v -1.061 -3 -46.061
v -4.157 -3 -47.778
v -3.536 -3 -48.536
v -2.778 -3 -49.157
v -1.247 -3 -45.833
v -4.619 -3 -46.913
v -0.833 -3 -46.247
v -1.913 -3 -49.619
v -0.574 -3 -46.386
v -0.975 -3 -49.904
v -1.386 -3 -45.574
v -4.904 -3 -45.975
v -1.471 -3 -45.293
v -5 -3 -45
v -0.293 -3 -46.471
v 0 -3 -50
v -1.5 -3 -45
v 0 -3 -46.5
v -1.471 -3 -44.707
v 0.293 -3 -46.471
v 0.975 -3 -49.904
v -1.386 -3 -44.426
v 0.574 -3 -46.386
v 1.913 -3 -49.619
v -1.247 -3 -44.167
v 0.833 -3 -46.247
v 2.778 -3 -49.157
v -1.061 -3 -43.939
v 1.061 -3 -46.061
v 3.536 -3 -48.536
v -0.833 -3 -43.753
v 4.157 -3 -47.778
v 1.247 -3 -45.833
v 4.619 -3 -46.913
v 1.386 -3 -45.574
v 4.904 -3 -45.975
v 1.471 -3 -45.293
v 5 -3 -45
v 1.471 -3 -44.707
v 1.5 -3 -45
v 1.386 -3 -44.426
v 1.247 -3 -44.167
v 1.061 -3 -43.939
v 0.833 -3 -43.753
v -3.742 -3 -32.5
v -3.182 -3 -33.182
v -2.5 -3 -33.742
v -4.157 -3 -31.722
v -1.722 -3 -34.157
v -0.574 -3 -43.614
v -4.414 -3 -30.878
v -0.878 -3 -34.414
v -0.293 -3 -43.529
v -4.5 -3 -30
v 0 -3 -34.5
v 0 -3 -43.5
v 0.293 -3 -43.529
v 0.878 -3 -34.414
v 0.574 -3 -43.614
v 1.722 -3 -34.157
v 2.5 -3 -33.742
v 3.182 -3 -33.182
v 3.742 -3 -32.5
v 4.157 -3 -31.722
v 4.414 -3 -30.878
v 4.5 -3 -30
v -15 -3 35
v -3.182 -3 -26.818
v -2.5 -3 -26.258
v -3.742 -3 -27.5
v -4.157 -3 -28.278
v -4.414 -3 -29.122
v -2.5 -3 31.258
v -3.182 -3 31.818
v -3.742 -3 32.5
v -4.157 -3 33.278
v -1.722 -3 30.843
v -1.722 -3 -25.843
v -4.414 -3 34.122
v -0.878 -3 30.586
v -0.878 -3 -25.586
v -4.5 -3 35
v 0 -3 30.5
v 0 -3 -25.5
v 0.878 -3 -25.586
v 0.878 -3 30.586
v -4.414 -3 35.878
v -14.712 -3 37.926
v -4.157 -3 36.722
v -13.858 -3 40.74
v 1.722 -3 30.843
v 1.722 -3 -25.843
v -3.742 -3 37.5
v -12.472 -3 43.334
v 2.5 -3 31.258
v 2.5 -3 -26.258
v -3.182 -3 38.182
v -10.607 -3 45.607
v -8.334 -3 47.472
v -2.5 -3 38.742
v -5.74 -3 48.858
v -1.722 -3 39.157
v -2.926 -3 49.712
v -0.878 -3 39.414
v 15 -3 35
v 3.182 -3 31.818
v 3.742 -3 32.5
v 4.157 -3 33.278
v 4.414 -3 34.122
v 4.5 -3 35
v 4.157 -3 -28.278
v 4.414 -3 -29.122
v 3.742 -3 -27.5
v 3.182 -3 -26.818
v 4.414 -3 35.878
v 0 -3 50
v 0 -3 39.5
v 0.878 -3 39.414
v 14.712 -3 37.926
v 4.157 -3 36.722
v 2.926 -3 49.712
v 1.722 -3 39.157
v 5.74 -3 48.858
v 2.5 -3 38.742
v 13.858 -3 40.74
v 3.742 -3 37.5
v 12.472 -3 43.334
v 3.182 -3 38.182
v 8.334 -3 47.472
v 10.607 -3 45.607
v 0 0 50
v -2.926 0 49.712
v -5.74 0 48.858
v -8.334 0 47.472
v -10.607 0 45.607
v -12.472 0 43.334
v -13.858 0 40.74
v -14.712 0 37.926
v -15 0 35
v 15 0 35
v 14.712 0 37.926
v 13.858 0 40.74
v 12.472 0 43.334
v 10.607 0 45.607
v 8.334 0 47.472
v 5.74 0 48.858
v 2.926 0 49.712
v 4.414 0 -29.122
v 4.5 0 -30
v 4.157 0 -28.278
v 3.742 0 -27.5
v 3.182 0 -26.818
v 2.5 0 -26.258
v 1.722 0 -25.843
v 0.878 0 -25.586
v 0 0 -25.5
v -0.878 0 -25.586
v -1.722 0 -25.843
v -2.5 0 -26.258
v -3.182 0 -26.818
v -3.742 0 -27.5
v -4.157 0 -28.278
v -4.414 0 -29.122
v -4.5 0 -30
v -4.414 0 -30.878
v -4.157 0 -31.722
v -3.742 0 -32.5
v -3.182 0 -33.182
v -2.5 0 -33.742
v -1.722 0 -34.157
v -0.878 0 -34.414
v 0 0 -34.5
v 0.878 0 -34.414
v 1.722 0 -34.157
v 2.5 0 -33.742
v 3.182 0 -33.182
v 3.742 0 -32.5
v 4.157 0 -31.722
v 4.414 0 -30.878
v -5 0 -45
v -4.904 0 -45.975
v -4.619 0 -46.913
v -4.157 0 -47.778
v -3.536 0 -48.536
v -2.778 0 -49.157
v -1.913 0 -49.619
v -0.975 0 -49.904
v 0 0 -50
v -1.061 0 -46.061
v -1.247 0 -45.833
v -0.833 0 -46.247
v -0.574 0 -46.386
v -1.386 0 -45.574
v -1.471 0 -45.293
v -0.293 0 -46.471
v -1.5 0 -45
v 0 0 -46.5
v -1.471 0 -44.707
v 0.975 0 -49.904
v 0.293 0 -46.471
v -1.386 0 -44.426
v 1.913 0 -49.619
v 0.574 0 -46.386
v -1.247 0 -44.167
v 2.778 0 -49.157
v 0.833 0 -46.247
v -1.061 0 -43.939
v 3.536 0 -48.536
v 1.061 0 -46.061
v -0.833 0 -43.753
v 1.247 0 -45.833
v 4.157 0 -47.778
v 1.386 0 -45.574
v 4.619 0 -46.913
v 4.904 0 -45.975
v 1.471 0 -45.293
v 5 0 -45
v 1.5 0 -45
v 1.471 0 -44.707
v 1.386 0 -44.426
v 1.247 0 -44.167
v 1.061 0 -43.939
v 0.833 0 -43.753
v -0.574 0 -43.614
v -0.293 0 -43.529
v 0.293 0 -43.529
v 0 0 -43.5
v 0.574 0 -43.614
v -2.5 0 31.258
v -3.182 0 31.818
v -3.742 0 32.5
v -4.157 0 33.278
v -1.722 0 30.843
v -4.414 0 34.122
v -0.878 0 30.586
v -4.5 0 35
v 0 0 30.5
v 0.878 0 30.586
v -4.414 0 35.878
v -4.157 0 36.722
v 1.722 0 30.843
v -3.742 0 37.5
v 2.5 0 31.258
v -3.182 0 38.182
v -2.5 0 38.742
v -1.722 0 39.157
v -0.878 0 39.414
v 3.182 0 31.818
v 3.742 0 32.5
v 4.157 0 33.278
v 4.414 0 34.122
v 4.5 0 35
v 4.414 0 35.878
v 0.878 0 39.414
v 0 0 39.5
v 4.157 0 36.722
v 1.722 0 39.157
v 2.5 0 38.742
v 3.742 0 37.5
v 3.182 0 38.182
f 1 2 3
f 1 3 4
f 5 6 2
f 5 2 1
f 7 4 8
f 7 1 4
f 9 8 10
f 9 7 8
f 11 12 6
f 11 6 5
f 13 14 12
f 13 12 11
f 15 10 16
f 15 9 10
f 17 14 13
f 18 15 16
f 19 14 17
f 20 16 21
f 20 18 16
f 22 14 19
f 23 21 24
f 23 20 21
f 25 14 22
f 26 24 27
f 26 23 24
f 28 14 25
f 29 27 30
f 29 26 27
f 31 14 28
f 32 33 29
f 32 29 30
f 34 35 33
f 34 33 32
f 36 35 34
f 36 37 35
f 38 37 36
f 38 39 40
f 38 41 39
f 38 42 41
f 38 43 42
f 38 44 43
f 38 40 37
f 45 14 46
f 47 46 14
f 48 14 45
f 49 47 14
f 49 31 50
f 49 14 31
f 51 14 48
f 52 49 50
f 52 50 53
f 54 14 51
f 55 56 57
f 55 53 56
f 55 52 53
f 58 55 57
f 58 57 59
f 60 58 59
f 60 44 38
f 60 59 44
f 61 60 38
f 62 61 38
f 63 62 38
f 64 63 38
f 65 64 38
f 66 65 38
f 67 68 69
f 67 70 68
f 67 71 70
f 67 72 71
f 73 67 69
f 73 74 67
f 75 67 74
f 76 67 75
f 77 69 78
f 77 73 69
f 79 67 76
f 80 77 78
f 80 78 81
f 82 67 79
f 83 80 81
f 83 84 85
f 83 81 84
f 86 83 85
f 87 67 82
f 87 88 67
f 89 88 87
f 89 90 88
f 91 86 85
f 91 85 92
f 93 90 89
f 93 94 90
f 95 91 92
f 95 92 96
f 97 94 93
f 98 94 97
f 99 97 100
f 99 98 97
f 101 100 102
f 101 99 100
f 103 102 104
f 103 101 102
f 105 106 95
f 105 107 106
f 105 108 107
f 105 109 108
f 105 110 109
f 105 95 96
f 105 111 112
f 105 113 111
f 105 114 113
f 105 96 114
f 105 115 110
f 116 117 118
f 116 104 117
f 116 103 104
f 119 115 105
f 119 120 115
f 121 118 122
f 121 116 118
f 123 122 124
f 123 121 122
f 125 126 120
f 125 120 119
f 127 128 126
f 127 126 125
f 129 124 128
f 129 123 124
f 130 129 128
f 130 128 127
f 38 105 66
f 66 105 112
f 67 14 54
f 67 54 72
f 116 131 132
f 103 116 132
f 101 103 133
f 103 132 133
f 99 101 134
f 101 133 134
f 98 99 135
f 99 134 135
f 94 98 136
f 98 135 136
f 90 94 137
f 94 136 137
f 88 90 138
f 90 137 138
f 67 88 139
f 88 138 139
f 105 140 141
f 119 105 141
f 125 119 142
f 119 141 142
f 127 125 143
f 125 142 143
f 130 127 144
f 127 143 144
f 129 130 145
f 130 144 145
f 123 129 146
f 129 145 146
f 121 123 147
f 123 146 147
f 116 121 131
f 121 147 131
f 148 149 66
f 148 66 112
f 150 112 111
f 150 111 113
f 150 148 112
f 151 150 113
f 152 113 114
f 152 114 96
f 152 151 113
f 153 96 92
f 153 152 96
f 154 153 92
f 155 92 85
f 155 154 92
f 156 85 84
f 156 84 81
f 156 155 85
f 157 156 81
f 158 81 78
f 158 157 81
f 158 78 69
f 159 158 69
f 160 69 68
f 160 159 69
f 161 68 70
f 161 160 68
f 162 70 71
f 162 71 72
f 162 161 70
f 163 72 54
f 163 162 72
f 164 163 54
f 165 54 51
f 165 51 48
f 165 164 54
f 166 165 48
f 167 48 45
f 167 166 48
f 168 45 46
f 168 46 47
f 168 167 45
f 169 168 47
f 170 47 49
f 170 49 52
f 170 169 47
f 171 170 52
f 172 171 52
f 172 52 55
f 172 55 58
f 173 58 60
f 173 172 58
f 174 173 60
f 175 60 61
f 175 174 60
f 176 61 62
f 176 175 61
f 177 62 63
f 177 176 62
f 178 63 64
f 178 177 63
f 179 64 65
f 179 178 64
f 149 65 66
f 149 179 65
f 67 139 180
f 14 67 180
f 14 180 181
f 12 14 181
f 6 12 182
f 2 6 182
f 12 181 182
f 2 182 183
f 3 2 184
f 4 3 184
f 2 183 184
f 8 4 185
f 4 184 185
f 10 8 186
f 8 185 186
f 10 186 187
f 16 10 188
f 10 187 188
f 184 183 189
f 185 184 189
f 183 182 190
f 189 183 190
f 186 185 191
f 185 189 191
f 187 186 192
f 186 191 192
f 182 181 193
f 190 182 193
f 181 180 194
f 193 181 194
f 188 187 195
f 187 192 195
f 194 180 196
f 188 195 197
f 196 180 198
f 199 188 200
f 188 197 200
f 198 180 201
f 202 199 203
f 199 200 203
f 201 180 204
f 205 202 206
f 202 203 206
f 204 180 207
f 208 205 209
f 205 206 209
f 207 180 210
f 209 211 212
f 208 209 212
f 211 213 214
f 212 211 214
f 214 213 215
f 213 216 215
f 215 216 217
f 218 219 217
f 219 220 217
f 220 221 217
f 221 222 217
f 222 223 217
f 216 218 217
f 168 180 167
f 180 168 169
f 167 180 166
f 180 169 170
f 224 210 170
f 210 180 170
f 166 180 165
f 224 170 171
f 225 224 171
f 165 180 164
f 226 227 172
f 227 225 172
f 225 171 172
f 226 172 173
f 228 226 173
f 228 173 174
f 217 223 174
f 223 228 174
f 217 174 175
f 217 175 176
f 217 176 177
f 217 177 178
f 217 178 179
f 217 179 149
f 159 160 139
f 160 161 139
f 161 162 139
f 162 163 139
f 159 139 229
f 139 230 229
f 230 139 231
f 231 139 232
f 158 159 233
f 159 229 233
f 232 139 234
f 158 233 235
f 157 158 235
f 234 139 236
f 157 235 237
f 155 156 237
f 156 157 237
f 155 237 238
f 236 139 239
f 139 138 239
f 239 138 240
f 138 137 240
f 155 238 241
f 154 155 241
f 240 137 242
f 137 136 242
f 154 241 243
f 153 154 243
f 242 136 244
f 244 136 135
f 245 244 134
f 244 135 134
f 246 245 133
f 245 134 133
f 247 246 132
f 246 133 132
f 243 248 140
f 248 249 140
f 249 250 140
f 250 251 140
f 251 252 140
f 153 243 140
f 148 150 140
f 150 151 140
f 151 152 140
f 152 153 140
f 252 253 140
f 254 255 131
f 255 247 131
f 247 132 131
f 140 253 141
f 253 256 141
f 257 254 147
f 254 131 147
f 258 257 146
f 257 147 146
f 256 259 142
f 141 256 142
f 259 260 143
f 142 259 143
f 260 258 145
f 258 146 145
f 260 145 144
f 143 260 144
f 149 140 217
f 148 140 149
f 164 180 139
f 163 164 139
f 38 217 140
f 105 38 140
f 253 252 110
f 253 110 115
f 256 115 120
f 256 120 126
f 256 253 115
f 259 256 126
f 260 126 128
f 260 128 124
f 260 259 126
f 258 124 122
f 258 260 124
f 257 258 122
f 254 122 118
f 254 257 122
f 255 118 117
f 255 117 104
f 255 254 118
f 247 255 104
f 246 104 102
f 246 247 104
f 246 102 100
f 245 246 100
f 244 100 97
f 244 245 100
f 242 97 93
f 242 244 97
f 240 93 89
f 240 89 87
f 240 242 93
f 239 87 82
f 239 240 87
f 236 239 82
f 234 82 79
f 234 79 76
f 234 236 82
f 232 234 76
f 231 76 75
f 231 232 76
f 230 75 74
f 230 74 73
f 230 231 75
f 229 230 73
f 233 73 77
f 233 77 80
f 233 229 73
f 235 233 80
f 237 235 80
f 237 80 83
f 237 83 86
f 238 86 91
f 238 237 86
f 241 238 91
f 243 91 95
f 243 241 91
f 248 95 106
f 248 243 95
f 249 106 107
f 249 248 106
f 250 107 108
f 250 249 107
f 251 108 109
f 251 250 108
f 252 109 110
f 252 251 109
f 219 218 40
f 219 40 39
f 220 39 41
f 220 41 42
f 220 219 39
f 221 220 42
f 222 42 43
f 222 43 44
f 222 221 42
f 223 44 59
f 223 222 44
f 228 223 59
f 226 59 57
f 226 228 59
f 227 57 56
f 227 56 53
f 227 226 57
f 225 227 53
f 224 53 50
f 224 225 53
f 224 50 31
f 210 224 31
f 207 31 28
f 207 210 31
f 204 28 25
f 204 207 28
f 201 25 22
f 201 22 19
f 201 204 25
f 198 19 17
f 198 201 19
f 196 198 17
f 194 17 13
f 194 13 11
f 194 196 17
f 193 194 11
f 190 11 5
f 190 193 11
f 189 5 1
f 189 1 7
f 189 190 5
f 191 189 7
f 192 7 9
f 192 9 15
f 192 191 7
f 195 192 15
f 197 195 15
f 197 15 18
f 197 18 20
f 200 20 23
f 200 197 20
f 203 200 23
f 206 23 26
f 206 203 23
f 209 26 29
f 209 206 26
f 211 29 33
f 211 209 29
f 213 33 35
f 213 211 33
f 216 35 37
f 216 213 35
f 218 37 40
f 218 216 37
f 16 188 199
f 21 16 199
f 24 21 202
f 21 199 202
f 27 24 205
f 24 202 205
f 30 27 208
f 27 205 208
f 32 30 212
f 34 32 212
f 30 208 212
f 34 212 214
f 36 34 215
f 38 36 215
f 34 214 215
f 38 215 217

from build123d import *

# Parameters (mm, degrees)
F0_R     = 1.5
F0_R_2   = 4.5
F1_DEPTH = 3


with BuildPart() as f1:
    # F0 (on Front) → F1 (new body)
    with BuildSketch(Plane.XZ):
        with BuildLine():
            ThreePointArc((-5, -45.000002), (-3.535534, -48.535536), (0, -50.000002))
            ThreePointArc((0, -50.000002), (3.535534, -48.535536), (5, -45.000002))
            Line((5, -45.000002), (15, 35))
            ThreePointArc((15, 35), (10.606602, 45.606602), (0, 50))
            ThreePointArc((0, 50), (-10.606602, 45.606602), (-15, 35))
            Line((-15, 35), (-5, -45.000002))
        make_face()
        with Locations((0, -45.000002)):
            Circle(F0_R, mode=Mode.SUBTRACT)
        with Locations((0, -30)):
            Circle(F0_R_2, mode=Mode.SUBTRACT)
        with Locations((0, 35)):
            Circle(F0_R_2, mode=Mode.SUBTRACT)
    extrude(amount=F1_DEPTH)


solid = f1.part
